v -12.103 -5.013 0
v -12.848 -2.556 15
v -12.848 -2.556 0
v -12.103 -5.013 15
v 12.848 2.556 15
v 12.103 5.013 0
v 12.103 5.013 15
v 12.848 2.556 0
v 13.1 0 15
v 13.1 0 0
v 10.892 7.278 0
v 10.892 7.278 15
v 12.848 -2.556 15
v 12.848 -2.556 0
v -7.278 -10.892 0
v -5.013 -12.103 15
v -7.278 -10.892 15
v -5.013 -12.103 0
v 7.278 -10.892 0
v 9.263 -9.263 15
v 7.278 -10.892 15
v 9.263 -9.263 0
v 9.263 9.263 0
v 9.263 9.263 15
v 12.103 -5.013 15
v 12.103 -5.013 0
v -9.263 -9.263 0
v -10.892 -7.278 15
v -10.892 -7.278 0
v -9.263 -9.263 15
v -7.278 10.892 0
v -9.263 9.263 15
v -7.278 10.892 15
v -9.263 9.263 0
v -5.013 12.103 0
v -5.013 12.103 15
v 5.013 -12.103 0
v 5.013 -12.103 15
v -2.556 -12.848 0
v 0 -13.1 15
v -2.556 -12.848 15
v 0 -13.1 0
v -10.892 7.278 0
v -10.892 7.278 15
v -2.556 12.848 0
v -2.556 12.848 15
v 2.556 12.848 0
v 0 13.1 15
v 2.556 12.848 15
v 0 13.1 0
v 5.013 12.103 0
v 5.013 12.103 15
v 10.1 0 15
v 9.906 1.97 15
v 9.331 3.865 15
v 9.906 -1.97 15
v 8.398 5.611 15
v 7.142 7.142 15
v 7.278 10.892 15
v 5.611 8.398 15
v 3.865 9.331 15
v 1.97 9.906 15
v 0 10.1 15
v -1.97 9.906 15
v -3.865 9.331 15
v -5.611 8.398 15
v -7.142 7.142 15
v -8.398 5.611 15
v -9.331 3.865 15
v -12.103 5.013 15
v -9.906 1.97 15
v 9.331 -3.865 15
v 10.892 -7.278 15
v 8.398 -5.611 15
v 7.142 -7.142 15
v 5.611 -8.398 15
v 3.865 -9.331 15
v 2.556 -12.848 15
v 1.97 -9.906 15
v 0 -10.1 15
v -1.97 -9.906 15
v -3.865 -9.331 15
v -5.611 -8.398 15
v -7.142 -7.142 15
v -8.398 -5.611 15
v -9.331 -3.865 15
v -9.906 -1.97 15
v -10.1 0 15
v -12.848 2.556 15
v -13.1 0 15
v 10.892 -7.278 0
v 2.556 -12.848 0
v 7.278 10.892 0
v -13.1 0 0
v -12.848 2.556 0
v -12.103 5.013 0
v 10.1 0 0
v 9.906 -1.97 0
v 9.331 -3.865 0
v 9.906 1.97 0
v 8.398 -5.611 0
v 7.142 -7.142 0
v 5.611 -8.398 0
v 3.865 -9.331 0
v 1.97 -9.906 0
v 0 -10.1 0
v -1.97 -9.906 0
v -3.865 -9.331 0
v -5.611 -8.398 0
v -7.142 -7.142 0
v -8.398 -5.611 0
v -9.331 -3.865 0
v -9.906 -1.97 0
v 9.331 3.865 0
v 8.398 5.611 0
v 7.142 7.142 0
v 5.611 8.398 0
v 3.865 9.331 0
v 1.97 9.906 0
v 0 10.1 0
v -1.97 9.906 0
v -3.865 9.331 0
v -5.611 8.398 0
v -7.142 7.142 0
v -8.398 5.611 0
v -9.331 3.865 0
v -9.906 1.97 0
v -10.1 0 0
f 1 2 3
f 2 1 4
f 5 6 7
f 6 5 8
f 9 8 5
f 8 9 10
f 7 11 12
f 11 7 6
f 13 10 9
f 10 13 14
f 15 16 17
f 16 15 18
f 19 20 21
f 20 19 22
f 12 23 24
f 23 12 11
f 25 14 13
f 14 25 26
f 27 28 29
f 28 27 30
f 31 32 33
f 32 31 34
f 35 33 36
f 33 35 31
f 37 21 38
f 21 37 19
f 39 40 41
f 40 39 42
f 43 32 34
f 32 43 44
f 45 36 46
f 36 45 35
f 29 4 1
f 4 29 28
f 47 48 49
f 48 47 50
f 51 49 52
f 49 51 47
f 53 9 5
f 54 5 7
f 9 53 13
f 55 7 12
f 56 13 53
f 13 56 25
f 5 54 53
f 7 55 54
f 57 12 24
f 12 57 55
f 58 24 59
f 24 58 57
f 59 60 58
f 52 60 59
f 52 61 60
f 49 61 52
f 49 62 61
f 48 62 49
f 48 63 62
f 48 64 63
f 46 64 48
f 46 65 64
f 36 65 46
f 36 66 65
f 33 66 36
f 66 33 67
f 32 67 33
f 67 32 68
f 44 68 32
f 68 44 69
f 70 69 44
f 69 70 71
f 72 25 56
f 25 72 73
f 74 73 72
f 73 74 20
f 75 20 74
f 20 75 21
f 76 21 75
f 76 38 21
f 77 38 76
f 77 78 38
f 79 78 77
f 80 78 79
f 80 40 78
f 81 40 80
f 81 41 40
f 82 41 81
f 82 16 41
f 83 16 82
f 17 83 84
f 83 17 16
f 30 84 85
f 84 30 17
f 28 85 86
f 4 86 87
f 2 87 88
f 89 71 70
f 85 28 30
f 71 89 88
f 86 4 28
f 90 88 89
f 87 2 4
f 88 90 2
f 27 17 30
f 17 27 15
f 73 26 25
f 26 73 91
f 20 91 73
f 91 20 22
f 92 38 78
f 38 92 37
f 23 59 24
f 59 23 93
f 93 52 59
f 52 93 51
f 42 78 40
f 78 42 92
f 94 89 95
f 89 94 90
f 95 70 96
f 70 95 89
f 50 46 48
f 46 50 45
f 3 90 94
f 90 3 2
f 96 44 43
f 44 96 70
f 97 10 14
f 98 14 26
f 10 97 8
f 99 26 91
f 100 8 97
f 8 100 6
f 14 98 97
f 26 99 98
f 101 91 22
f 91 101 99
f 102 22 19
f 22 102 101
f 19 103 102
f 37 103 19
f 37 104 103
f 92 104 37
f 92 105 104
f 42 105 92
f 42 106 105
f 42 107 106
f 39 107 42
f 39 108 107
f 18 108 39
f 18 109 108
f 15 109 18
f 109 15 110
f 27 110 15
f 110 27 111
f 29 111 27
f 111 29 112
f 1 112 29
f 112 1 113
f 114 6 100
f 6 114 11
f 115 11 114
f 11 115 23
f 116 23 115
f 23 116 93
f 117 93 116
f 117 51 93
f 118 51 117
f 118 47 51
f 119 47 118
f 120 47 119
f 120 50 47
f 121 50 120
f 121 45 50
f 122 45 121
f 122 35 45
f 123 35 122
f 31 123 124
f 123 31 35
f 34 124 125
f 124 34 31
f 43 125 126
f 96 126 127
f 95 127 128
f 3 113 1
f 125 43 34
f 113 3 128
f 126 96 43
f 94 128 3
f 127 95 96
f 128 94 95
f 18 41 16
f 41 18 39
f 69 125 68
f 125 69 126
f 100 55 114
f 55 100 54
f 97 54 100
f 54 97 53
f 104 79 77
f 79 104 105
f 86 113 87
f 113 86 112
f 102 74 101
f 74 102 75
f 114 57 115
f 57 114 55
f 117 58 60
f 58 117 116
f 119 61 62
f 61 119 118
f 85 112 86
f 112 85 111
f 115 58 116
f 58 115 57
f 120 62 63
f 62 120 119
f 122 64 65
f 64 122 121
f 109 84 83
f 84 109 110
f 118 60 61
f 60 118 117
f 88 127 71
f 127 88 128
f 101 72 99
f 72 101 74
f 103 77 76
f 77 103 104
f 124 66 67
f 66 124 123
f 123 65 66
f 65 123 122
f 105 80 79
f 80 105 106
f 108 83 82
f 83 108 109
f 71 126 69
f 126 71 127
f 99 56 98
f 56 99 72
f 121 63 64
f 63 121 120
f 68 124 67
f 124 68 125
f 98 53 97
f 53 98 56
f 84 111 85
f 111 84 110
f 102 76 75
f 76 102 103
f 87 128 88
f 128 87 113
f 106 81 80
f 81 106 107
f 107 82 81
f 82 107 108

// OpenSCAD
$fn = 32;

// ----------------------------------------------------------------------
// Spacer sleeve: 26.2 / 20.2 x 15 mm
// ----------------------------------------------------------------------

// --- parameters (mm) ---
outer_d = 26.2;           // outside diameter
inner_d = 20.2;           // shaft bore
length = 15;              // sleeve length

module sleeve() {
  cylinder(h = length, d = outer_d);
}

difference() {
  sleeve();
  translate([0, 0, -1]) cylinder(h = length + 2, d = inner_d);
}
